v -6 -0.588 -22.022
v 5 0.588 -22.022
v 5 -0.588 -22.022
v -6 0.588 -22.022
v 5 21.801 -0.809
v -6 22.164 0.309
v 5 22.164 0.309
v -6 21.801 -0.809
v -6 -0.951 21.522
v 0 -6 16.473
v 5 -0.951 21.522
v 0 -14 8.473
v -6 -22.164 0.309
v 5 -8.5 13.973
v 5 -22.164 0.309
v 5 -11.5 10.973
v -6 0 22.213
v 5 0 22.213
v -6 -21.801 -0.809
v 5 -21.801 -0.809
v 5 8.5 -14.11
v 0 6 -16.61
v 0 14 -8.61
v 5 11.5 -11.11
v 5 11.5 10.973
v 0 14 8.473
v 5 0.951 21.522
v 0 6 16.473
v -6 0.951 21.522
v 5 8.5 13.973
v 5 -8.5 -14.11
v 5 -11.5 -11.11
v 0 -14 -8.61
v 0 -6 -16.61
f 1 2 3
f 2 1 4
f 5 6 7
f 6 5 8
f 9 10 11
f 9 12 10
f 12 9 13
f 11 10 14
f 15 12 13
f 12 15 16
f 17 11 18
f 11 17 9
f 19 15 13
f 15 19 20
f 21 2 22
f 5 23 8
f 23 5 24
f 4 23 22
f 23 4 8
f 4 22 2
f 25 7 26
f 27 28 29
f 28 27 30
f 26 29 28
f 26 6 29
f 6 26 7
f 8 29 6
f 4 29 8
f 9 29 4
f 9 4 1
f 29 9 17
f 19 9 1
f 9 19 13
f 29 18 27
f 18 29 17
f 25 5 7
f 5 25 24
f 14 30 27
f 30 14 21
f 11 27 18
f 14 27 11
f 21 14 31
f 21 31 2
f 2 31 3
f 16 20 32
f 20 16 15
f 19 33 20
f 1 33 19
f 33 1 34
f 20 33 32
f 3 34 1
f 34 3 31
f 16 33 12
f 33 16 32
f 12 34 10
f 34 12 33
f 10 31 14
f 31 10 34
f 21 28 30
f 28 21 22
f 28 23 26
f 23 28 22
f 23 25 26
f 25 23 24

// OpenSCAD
module dovetail(){
	translate([0,-10,-15])  linear_extrude(height=80, convexity=10, twist=0)
	polygon(points=[[0,-4],[0,4],[8,0]]);
}
	




module side1(){
	difference(){
	minkowski()
{
	rotate([45,0,0]) cube([10,30,30], center=true);
	rotate([0,-90,0]) cylinder(r=1,h=1);
}
	translate([0,0,-15]) dovetail();
	translate([0,20,-15]) dovetail();
}
}


	side1();
